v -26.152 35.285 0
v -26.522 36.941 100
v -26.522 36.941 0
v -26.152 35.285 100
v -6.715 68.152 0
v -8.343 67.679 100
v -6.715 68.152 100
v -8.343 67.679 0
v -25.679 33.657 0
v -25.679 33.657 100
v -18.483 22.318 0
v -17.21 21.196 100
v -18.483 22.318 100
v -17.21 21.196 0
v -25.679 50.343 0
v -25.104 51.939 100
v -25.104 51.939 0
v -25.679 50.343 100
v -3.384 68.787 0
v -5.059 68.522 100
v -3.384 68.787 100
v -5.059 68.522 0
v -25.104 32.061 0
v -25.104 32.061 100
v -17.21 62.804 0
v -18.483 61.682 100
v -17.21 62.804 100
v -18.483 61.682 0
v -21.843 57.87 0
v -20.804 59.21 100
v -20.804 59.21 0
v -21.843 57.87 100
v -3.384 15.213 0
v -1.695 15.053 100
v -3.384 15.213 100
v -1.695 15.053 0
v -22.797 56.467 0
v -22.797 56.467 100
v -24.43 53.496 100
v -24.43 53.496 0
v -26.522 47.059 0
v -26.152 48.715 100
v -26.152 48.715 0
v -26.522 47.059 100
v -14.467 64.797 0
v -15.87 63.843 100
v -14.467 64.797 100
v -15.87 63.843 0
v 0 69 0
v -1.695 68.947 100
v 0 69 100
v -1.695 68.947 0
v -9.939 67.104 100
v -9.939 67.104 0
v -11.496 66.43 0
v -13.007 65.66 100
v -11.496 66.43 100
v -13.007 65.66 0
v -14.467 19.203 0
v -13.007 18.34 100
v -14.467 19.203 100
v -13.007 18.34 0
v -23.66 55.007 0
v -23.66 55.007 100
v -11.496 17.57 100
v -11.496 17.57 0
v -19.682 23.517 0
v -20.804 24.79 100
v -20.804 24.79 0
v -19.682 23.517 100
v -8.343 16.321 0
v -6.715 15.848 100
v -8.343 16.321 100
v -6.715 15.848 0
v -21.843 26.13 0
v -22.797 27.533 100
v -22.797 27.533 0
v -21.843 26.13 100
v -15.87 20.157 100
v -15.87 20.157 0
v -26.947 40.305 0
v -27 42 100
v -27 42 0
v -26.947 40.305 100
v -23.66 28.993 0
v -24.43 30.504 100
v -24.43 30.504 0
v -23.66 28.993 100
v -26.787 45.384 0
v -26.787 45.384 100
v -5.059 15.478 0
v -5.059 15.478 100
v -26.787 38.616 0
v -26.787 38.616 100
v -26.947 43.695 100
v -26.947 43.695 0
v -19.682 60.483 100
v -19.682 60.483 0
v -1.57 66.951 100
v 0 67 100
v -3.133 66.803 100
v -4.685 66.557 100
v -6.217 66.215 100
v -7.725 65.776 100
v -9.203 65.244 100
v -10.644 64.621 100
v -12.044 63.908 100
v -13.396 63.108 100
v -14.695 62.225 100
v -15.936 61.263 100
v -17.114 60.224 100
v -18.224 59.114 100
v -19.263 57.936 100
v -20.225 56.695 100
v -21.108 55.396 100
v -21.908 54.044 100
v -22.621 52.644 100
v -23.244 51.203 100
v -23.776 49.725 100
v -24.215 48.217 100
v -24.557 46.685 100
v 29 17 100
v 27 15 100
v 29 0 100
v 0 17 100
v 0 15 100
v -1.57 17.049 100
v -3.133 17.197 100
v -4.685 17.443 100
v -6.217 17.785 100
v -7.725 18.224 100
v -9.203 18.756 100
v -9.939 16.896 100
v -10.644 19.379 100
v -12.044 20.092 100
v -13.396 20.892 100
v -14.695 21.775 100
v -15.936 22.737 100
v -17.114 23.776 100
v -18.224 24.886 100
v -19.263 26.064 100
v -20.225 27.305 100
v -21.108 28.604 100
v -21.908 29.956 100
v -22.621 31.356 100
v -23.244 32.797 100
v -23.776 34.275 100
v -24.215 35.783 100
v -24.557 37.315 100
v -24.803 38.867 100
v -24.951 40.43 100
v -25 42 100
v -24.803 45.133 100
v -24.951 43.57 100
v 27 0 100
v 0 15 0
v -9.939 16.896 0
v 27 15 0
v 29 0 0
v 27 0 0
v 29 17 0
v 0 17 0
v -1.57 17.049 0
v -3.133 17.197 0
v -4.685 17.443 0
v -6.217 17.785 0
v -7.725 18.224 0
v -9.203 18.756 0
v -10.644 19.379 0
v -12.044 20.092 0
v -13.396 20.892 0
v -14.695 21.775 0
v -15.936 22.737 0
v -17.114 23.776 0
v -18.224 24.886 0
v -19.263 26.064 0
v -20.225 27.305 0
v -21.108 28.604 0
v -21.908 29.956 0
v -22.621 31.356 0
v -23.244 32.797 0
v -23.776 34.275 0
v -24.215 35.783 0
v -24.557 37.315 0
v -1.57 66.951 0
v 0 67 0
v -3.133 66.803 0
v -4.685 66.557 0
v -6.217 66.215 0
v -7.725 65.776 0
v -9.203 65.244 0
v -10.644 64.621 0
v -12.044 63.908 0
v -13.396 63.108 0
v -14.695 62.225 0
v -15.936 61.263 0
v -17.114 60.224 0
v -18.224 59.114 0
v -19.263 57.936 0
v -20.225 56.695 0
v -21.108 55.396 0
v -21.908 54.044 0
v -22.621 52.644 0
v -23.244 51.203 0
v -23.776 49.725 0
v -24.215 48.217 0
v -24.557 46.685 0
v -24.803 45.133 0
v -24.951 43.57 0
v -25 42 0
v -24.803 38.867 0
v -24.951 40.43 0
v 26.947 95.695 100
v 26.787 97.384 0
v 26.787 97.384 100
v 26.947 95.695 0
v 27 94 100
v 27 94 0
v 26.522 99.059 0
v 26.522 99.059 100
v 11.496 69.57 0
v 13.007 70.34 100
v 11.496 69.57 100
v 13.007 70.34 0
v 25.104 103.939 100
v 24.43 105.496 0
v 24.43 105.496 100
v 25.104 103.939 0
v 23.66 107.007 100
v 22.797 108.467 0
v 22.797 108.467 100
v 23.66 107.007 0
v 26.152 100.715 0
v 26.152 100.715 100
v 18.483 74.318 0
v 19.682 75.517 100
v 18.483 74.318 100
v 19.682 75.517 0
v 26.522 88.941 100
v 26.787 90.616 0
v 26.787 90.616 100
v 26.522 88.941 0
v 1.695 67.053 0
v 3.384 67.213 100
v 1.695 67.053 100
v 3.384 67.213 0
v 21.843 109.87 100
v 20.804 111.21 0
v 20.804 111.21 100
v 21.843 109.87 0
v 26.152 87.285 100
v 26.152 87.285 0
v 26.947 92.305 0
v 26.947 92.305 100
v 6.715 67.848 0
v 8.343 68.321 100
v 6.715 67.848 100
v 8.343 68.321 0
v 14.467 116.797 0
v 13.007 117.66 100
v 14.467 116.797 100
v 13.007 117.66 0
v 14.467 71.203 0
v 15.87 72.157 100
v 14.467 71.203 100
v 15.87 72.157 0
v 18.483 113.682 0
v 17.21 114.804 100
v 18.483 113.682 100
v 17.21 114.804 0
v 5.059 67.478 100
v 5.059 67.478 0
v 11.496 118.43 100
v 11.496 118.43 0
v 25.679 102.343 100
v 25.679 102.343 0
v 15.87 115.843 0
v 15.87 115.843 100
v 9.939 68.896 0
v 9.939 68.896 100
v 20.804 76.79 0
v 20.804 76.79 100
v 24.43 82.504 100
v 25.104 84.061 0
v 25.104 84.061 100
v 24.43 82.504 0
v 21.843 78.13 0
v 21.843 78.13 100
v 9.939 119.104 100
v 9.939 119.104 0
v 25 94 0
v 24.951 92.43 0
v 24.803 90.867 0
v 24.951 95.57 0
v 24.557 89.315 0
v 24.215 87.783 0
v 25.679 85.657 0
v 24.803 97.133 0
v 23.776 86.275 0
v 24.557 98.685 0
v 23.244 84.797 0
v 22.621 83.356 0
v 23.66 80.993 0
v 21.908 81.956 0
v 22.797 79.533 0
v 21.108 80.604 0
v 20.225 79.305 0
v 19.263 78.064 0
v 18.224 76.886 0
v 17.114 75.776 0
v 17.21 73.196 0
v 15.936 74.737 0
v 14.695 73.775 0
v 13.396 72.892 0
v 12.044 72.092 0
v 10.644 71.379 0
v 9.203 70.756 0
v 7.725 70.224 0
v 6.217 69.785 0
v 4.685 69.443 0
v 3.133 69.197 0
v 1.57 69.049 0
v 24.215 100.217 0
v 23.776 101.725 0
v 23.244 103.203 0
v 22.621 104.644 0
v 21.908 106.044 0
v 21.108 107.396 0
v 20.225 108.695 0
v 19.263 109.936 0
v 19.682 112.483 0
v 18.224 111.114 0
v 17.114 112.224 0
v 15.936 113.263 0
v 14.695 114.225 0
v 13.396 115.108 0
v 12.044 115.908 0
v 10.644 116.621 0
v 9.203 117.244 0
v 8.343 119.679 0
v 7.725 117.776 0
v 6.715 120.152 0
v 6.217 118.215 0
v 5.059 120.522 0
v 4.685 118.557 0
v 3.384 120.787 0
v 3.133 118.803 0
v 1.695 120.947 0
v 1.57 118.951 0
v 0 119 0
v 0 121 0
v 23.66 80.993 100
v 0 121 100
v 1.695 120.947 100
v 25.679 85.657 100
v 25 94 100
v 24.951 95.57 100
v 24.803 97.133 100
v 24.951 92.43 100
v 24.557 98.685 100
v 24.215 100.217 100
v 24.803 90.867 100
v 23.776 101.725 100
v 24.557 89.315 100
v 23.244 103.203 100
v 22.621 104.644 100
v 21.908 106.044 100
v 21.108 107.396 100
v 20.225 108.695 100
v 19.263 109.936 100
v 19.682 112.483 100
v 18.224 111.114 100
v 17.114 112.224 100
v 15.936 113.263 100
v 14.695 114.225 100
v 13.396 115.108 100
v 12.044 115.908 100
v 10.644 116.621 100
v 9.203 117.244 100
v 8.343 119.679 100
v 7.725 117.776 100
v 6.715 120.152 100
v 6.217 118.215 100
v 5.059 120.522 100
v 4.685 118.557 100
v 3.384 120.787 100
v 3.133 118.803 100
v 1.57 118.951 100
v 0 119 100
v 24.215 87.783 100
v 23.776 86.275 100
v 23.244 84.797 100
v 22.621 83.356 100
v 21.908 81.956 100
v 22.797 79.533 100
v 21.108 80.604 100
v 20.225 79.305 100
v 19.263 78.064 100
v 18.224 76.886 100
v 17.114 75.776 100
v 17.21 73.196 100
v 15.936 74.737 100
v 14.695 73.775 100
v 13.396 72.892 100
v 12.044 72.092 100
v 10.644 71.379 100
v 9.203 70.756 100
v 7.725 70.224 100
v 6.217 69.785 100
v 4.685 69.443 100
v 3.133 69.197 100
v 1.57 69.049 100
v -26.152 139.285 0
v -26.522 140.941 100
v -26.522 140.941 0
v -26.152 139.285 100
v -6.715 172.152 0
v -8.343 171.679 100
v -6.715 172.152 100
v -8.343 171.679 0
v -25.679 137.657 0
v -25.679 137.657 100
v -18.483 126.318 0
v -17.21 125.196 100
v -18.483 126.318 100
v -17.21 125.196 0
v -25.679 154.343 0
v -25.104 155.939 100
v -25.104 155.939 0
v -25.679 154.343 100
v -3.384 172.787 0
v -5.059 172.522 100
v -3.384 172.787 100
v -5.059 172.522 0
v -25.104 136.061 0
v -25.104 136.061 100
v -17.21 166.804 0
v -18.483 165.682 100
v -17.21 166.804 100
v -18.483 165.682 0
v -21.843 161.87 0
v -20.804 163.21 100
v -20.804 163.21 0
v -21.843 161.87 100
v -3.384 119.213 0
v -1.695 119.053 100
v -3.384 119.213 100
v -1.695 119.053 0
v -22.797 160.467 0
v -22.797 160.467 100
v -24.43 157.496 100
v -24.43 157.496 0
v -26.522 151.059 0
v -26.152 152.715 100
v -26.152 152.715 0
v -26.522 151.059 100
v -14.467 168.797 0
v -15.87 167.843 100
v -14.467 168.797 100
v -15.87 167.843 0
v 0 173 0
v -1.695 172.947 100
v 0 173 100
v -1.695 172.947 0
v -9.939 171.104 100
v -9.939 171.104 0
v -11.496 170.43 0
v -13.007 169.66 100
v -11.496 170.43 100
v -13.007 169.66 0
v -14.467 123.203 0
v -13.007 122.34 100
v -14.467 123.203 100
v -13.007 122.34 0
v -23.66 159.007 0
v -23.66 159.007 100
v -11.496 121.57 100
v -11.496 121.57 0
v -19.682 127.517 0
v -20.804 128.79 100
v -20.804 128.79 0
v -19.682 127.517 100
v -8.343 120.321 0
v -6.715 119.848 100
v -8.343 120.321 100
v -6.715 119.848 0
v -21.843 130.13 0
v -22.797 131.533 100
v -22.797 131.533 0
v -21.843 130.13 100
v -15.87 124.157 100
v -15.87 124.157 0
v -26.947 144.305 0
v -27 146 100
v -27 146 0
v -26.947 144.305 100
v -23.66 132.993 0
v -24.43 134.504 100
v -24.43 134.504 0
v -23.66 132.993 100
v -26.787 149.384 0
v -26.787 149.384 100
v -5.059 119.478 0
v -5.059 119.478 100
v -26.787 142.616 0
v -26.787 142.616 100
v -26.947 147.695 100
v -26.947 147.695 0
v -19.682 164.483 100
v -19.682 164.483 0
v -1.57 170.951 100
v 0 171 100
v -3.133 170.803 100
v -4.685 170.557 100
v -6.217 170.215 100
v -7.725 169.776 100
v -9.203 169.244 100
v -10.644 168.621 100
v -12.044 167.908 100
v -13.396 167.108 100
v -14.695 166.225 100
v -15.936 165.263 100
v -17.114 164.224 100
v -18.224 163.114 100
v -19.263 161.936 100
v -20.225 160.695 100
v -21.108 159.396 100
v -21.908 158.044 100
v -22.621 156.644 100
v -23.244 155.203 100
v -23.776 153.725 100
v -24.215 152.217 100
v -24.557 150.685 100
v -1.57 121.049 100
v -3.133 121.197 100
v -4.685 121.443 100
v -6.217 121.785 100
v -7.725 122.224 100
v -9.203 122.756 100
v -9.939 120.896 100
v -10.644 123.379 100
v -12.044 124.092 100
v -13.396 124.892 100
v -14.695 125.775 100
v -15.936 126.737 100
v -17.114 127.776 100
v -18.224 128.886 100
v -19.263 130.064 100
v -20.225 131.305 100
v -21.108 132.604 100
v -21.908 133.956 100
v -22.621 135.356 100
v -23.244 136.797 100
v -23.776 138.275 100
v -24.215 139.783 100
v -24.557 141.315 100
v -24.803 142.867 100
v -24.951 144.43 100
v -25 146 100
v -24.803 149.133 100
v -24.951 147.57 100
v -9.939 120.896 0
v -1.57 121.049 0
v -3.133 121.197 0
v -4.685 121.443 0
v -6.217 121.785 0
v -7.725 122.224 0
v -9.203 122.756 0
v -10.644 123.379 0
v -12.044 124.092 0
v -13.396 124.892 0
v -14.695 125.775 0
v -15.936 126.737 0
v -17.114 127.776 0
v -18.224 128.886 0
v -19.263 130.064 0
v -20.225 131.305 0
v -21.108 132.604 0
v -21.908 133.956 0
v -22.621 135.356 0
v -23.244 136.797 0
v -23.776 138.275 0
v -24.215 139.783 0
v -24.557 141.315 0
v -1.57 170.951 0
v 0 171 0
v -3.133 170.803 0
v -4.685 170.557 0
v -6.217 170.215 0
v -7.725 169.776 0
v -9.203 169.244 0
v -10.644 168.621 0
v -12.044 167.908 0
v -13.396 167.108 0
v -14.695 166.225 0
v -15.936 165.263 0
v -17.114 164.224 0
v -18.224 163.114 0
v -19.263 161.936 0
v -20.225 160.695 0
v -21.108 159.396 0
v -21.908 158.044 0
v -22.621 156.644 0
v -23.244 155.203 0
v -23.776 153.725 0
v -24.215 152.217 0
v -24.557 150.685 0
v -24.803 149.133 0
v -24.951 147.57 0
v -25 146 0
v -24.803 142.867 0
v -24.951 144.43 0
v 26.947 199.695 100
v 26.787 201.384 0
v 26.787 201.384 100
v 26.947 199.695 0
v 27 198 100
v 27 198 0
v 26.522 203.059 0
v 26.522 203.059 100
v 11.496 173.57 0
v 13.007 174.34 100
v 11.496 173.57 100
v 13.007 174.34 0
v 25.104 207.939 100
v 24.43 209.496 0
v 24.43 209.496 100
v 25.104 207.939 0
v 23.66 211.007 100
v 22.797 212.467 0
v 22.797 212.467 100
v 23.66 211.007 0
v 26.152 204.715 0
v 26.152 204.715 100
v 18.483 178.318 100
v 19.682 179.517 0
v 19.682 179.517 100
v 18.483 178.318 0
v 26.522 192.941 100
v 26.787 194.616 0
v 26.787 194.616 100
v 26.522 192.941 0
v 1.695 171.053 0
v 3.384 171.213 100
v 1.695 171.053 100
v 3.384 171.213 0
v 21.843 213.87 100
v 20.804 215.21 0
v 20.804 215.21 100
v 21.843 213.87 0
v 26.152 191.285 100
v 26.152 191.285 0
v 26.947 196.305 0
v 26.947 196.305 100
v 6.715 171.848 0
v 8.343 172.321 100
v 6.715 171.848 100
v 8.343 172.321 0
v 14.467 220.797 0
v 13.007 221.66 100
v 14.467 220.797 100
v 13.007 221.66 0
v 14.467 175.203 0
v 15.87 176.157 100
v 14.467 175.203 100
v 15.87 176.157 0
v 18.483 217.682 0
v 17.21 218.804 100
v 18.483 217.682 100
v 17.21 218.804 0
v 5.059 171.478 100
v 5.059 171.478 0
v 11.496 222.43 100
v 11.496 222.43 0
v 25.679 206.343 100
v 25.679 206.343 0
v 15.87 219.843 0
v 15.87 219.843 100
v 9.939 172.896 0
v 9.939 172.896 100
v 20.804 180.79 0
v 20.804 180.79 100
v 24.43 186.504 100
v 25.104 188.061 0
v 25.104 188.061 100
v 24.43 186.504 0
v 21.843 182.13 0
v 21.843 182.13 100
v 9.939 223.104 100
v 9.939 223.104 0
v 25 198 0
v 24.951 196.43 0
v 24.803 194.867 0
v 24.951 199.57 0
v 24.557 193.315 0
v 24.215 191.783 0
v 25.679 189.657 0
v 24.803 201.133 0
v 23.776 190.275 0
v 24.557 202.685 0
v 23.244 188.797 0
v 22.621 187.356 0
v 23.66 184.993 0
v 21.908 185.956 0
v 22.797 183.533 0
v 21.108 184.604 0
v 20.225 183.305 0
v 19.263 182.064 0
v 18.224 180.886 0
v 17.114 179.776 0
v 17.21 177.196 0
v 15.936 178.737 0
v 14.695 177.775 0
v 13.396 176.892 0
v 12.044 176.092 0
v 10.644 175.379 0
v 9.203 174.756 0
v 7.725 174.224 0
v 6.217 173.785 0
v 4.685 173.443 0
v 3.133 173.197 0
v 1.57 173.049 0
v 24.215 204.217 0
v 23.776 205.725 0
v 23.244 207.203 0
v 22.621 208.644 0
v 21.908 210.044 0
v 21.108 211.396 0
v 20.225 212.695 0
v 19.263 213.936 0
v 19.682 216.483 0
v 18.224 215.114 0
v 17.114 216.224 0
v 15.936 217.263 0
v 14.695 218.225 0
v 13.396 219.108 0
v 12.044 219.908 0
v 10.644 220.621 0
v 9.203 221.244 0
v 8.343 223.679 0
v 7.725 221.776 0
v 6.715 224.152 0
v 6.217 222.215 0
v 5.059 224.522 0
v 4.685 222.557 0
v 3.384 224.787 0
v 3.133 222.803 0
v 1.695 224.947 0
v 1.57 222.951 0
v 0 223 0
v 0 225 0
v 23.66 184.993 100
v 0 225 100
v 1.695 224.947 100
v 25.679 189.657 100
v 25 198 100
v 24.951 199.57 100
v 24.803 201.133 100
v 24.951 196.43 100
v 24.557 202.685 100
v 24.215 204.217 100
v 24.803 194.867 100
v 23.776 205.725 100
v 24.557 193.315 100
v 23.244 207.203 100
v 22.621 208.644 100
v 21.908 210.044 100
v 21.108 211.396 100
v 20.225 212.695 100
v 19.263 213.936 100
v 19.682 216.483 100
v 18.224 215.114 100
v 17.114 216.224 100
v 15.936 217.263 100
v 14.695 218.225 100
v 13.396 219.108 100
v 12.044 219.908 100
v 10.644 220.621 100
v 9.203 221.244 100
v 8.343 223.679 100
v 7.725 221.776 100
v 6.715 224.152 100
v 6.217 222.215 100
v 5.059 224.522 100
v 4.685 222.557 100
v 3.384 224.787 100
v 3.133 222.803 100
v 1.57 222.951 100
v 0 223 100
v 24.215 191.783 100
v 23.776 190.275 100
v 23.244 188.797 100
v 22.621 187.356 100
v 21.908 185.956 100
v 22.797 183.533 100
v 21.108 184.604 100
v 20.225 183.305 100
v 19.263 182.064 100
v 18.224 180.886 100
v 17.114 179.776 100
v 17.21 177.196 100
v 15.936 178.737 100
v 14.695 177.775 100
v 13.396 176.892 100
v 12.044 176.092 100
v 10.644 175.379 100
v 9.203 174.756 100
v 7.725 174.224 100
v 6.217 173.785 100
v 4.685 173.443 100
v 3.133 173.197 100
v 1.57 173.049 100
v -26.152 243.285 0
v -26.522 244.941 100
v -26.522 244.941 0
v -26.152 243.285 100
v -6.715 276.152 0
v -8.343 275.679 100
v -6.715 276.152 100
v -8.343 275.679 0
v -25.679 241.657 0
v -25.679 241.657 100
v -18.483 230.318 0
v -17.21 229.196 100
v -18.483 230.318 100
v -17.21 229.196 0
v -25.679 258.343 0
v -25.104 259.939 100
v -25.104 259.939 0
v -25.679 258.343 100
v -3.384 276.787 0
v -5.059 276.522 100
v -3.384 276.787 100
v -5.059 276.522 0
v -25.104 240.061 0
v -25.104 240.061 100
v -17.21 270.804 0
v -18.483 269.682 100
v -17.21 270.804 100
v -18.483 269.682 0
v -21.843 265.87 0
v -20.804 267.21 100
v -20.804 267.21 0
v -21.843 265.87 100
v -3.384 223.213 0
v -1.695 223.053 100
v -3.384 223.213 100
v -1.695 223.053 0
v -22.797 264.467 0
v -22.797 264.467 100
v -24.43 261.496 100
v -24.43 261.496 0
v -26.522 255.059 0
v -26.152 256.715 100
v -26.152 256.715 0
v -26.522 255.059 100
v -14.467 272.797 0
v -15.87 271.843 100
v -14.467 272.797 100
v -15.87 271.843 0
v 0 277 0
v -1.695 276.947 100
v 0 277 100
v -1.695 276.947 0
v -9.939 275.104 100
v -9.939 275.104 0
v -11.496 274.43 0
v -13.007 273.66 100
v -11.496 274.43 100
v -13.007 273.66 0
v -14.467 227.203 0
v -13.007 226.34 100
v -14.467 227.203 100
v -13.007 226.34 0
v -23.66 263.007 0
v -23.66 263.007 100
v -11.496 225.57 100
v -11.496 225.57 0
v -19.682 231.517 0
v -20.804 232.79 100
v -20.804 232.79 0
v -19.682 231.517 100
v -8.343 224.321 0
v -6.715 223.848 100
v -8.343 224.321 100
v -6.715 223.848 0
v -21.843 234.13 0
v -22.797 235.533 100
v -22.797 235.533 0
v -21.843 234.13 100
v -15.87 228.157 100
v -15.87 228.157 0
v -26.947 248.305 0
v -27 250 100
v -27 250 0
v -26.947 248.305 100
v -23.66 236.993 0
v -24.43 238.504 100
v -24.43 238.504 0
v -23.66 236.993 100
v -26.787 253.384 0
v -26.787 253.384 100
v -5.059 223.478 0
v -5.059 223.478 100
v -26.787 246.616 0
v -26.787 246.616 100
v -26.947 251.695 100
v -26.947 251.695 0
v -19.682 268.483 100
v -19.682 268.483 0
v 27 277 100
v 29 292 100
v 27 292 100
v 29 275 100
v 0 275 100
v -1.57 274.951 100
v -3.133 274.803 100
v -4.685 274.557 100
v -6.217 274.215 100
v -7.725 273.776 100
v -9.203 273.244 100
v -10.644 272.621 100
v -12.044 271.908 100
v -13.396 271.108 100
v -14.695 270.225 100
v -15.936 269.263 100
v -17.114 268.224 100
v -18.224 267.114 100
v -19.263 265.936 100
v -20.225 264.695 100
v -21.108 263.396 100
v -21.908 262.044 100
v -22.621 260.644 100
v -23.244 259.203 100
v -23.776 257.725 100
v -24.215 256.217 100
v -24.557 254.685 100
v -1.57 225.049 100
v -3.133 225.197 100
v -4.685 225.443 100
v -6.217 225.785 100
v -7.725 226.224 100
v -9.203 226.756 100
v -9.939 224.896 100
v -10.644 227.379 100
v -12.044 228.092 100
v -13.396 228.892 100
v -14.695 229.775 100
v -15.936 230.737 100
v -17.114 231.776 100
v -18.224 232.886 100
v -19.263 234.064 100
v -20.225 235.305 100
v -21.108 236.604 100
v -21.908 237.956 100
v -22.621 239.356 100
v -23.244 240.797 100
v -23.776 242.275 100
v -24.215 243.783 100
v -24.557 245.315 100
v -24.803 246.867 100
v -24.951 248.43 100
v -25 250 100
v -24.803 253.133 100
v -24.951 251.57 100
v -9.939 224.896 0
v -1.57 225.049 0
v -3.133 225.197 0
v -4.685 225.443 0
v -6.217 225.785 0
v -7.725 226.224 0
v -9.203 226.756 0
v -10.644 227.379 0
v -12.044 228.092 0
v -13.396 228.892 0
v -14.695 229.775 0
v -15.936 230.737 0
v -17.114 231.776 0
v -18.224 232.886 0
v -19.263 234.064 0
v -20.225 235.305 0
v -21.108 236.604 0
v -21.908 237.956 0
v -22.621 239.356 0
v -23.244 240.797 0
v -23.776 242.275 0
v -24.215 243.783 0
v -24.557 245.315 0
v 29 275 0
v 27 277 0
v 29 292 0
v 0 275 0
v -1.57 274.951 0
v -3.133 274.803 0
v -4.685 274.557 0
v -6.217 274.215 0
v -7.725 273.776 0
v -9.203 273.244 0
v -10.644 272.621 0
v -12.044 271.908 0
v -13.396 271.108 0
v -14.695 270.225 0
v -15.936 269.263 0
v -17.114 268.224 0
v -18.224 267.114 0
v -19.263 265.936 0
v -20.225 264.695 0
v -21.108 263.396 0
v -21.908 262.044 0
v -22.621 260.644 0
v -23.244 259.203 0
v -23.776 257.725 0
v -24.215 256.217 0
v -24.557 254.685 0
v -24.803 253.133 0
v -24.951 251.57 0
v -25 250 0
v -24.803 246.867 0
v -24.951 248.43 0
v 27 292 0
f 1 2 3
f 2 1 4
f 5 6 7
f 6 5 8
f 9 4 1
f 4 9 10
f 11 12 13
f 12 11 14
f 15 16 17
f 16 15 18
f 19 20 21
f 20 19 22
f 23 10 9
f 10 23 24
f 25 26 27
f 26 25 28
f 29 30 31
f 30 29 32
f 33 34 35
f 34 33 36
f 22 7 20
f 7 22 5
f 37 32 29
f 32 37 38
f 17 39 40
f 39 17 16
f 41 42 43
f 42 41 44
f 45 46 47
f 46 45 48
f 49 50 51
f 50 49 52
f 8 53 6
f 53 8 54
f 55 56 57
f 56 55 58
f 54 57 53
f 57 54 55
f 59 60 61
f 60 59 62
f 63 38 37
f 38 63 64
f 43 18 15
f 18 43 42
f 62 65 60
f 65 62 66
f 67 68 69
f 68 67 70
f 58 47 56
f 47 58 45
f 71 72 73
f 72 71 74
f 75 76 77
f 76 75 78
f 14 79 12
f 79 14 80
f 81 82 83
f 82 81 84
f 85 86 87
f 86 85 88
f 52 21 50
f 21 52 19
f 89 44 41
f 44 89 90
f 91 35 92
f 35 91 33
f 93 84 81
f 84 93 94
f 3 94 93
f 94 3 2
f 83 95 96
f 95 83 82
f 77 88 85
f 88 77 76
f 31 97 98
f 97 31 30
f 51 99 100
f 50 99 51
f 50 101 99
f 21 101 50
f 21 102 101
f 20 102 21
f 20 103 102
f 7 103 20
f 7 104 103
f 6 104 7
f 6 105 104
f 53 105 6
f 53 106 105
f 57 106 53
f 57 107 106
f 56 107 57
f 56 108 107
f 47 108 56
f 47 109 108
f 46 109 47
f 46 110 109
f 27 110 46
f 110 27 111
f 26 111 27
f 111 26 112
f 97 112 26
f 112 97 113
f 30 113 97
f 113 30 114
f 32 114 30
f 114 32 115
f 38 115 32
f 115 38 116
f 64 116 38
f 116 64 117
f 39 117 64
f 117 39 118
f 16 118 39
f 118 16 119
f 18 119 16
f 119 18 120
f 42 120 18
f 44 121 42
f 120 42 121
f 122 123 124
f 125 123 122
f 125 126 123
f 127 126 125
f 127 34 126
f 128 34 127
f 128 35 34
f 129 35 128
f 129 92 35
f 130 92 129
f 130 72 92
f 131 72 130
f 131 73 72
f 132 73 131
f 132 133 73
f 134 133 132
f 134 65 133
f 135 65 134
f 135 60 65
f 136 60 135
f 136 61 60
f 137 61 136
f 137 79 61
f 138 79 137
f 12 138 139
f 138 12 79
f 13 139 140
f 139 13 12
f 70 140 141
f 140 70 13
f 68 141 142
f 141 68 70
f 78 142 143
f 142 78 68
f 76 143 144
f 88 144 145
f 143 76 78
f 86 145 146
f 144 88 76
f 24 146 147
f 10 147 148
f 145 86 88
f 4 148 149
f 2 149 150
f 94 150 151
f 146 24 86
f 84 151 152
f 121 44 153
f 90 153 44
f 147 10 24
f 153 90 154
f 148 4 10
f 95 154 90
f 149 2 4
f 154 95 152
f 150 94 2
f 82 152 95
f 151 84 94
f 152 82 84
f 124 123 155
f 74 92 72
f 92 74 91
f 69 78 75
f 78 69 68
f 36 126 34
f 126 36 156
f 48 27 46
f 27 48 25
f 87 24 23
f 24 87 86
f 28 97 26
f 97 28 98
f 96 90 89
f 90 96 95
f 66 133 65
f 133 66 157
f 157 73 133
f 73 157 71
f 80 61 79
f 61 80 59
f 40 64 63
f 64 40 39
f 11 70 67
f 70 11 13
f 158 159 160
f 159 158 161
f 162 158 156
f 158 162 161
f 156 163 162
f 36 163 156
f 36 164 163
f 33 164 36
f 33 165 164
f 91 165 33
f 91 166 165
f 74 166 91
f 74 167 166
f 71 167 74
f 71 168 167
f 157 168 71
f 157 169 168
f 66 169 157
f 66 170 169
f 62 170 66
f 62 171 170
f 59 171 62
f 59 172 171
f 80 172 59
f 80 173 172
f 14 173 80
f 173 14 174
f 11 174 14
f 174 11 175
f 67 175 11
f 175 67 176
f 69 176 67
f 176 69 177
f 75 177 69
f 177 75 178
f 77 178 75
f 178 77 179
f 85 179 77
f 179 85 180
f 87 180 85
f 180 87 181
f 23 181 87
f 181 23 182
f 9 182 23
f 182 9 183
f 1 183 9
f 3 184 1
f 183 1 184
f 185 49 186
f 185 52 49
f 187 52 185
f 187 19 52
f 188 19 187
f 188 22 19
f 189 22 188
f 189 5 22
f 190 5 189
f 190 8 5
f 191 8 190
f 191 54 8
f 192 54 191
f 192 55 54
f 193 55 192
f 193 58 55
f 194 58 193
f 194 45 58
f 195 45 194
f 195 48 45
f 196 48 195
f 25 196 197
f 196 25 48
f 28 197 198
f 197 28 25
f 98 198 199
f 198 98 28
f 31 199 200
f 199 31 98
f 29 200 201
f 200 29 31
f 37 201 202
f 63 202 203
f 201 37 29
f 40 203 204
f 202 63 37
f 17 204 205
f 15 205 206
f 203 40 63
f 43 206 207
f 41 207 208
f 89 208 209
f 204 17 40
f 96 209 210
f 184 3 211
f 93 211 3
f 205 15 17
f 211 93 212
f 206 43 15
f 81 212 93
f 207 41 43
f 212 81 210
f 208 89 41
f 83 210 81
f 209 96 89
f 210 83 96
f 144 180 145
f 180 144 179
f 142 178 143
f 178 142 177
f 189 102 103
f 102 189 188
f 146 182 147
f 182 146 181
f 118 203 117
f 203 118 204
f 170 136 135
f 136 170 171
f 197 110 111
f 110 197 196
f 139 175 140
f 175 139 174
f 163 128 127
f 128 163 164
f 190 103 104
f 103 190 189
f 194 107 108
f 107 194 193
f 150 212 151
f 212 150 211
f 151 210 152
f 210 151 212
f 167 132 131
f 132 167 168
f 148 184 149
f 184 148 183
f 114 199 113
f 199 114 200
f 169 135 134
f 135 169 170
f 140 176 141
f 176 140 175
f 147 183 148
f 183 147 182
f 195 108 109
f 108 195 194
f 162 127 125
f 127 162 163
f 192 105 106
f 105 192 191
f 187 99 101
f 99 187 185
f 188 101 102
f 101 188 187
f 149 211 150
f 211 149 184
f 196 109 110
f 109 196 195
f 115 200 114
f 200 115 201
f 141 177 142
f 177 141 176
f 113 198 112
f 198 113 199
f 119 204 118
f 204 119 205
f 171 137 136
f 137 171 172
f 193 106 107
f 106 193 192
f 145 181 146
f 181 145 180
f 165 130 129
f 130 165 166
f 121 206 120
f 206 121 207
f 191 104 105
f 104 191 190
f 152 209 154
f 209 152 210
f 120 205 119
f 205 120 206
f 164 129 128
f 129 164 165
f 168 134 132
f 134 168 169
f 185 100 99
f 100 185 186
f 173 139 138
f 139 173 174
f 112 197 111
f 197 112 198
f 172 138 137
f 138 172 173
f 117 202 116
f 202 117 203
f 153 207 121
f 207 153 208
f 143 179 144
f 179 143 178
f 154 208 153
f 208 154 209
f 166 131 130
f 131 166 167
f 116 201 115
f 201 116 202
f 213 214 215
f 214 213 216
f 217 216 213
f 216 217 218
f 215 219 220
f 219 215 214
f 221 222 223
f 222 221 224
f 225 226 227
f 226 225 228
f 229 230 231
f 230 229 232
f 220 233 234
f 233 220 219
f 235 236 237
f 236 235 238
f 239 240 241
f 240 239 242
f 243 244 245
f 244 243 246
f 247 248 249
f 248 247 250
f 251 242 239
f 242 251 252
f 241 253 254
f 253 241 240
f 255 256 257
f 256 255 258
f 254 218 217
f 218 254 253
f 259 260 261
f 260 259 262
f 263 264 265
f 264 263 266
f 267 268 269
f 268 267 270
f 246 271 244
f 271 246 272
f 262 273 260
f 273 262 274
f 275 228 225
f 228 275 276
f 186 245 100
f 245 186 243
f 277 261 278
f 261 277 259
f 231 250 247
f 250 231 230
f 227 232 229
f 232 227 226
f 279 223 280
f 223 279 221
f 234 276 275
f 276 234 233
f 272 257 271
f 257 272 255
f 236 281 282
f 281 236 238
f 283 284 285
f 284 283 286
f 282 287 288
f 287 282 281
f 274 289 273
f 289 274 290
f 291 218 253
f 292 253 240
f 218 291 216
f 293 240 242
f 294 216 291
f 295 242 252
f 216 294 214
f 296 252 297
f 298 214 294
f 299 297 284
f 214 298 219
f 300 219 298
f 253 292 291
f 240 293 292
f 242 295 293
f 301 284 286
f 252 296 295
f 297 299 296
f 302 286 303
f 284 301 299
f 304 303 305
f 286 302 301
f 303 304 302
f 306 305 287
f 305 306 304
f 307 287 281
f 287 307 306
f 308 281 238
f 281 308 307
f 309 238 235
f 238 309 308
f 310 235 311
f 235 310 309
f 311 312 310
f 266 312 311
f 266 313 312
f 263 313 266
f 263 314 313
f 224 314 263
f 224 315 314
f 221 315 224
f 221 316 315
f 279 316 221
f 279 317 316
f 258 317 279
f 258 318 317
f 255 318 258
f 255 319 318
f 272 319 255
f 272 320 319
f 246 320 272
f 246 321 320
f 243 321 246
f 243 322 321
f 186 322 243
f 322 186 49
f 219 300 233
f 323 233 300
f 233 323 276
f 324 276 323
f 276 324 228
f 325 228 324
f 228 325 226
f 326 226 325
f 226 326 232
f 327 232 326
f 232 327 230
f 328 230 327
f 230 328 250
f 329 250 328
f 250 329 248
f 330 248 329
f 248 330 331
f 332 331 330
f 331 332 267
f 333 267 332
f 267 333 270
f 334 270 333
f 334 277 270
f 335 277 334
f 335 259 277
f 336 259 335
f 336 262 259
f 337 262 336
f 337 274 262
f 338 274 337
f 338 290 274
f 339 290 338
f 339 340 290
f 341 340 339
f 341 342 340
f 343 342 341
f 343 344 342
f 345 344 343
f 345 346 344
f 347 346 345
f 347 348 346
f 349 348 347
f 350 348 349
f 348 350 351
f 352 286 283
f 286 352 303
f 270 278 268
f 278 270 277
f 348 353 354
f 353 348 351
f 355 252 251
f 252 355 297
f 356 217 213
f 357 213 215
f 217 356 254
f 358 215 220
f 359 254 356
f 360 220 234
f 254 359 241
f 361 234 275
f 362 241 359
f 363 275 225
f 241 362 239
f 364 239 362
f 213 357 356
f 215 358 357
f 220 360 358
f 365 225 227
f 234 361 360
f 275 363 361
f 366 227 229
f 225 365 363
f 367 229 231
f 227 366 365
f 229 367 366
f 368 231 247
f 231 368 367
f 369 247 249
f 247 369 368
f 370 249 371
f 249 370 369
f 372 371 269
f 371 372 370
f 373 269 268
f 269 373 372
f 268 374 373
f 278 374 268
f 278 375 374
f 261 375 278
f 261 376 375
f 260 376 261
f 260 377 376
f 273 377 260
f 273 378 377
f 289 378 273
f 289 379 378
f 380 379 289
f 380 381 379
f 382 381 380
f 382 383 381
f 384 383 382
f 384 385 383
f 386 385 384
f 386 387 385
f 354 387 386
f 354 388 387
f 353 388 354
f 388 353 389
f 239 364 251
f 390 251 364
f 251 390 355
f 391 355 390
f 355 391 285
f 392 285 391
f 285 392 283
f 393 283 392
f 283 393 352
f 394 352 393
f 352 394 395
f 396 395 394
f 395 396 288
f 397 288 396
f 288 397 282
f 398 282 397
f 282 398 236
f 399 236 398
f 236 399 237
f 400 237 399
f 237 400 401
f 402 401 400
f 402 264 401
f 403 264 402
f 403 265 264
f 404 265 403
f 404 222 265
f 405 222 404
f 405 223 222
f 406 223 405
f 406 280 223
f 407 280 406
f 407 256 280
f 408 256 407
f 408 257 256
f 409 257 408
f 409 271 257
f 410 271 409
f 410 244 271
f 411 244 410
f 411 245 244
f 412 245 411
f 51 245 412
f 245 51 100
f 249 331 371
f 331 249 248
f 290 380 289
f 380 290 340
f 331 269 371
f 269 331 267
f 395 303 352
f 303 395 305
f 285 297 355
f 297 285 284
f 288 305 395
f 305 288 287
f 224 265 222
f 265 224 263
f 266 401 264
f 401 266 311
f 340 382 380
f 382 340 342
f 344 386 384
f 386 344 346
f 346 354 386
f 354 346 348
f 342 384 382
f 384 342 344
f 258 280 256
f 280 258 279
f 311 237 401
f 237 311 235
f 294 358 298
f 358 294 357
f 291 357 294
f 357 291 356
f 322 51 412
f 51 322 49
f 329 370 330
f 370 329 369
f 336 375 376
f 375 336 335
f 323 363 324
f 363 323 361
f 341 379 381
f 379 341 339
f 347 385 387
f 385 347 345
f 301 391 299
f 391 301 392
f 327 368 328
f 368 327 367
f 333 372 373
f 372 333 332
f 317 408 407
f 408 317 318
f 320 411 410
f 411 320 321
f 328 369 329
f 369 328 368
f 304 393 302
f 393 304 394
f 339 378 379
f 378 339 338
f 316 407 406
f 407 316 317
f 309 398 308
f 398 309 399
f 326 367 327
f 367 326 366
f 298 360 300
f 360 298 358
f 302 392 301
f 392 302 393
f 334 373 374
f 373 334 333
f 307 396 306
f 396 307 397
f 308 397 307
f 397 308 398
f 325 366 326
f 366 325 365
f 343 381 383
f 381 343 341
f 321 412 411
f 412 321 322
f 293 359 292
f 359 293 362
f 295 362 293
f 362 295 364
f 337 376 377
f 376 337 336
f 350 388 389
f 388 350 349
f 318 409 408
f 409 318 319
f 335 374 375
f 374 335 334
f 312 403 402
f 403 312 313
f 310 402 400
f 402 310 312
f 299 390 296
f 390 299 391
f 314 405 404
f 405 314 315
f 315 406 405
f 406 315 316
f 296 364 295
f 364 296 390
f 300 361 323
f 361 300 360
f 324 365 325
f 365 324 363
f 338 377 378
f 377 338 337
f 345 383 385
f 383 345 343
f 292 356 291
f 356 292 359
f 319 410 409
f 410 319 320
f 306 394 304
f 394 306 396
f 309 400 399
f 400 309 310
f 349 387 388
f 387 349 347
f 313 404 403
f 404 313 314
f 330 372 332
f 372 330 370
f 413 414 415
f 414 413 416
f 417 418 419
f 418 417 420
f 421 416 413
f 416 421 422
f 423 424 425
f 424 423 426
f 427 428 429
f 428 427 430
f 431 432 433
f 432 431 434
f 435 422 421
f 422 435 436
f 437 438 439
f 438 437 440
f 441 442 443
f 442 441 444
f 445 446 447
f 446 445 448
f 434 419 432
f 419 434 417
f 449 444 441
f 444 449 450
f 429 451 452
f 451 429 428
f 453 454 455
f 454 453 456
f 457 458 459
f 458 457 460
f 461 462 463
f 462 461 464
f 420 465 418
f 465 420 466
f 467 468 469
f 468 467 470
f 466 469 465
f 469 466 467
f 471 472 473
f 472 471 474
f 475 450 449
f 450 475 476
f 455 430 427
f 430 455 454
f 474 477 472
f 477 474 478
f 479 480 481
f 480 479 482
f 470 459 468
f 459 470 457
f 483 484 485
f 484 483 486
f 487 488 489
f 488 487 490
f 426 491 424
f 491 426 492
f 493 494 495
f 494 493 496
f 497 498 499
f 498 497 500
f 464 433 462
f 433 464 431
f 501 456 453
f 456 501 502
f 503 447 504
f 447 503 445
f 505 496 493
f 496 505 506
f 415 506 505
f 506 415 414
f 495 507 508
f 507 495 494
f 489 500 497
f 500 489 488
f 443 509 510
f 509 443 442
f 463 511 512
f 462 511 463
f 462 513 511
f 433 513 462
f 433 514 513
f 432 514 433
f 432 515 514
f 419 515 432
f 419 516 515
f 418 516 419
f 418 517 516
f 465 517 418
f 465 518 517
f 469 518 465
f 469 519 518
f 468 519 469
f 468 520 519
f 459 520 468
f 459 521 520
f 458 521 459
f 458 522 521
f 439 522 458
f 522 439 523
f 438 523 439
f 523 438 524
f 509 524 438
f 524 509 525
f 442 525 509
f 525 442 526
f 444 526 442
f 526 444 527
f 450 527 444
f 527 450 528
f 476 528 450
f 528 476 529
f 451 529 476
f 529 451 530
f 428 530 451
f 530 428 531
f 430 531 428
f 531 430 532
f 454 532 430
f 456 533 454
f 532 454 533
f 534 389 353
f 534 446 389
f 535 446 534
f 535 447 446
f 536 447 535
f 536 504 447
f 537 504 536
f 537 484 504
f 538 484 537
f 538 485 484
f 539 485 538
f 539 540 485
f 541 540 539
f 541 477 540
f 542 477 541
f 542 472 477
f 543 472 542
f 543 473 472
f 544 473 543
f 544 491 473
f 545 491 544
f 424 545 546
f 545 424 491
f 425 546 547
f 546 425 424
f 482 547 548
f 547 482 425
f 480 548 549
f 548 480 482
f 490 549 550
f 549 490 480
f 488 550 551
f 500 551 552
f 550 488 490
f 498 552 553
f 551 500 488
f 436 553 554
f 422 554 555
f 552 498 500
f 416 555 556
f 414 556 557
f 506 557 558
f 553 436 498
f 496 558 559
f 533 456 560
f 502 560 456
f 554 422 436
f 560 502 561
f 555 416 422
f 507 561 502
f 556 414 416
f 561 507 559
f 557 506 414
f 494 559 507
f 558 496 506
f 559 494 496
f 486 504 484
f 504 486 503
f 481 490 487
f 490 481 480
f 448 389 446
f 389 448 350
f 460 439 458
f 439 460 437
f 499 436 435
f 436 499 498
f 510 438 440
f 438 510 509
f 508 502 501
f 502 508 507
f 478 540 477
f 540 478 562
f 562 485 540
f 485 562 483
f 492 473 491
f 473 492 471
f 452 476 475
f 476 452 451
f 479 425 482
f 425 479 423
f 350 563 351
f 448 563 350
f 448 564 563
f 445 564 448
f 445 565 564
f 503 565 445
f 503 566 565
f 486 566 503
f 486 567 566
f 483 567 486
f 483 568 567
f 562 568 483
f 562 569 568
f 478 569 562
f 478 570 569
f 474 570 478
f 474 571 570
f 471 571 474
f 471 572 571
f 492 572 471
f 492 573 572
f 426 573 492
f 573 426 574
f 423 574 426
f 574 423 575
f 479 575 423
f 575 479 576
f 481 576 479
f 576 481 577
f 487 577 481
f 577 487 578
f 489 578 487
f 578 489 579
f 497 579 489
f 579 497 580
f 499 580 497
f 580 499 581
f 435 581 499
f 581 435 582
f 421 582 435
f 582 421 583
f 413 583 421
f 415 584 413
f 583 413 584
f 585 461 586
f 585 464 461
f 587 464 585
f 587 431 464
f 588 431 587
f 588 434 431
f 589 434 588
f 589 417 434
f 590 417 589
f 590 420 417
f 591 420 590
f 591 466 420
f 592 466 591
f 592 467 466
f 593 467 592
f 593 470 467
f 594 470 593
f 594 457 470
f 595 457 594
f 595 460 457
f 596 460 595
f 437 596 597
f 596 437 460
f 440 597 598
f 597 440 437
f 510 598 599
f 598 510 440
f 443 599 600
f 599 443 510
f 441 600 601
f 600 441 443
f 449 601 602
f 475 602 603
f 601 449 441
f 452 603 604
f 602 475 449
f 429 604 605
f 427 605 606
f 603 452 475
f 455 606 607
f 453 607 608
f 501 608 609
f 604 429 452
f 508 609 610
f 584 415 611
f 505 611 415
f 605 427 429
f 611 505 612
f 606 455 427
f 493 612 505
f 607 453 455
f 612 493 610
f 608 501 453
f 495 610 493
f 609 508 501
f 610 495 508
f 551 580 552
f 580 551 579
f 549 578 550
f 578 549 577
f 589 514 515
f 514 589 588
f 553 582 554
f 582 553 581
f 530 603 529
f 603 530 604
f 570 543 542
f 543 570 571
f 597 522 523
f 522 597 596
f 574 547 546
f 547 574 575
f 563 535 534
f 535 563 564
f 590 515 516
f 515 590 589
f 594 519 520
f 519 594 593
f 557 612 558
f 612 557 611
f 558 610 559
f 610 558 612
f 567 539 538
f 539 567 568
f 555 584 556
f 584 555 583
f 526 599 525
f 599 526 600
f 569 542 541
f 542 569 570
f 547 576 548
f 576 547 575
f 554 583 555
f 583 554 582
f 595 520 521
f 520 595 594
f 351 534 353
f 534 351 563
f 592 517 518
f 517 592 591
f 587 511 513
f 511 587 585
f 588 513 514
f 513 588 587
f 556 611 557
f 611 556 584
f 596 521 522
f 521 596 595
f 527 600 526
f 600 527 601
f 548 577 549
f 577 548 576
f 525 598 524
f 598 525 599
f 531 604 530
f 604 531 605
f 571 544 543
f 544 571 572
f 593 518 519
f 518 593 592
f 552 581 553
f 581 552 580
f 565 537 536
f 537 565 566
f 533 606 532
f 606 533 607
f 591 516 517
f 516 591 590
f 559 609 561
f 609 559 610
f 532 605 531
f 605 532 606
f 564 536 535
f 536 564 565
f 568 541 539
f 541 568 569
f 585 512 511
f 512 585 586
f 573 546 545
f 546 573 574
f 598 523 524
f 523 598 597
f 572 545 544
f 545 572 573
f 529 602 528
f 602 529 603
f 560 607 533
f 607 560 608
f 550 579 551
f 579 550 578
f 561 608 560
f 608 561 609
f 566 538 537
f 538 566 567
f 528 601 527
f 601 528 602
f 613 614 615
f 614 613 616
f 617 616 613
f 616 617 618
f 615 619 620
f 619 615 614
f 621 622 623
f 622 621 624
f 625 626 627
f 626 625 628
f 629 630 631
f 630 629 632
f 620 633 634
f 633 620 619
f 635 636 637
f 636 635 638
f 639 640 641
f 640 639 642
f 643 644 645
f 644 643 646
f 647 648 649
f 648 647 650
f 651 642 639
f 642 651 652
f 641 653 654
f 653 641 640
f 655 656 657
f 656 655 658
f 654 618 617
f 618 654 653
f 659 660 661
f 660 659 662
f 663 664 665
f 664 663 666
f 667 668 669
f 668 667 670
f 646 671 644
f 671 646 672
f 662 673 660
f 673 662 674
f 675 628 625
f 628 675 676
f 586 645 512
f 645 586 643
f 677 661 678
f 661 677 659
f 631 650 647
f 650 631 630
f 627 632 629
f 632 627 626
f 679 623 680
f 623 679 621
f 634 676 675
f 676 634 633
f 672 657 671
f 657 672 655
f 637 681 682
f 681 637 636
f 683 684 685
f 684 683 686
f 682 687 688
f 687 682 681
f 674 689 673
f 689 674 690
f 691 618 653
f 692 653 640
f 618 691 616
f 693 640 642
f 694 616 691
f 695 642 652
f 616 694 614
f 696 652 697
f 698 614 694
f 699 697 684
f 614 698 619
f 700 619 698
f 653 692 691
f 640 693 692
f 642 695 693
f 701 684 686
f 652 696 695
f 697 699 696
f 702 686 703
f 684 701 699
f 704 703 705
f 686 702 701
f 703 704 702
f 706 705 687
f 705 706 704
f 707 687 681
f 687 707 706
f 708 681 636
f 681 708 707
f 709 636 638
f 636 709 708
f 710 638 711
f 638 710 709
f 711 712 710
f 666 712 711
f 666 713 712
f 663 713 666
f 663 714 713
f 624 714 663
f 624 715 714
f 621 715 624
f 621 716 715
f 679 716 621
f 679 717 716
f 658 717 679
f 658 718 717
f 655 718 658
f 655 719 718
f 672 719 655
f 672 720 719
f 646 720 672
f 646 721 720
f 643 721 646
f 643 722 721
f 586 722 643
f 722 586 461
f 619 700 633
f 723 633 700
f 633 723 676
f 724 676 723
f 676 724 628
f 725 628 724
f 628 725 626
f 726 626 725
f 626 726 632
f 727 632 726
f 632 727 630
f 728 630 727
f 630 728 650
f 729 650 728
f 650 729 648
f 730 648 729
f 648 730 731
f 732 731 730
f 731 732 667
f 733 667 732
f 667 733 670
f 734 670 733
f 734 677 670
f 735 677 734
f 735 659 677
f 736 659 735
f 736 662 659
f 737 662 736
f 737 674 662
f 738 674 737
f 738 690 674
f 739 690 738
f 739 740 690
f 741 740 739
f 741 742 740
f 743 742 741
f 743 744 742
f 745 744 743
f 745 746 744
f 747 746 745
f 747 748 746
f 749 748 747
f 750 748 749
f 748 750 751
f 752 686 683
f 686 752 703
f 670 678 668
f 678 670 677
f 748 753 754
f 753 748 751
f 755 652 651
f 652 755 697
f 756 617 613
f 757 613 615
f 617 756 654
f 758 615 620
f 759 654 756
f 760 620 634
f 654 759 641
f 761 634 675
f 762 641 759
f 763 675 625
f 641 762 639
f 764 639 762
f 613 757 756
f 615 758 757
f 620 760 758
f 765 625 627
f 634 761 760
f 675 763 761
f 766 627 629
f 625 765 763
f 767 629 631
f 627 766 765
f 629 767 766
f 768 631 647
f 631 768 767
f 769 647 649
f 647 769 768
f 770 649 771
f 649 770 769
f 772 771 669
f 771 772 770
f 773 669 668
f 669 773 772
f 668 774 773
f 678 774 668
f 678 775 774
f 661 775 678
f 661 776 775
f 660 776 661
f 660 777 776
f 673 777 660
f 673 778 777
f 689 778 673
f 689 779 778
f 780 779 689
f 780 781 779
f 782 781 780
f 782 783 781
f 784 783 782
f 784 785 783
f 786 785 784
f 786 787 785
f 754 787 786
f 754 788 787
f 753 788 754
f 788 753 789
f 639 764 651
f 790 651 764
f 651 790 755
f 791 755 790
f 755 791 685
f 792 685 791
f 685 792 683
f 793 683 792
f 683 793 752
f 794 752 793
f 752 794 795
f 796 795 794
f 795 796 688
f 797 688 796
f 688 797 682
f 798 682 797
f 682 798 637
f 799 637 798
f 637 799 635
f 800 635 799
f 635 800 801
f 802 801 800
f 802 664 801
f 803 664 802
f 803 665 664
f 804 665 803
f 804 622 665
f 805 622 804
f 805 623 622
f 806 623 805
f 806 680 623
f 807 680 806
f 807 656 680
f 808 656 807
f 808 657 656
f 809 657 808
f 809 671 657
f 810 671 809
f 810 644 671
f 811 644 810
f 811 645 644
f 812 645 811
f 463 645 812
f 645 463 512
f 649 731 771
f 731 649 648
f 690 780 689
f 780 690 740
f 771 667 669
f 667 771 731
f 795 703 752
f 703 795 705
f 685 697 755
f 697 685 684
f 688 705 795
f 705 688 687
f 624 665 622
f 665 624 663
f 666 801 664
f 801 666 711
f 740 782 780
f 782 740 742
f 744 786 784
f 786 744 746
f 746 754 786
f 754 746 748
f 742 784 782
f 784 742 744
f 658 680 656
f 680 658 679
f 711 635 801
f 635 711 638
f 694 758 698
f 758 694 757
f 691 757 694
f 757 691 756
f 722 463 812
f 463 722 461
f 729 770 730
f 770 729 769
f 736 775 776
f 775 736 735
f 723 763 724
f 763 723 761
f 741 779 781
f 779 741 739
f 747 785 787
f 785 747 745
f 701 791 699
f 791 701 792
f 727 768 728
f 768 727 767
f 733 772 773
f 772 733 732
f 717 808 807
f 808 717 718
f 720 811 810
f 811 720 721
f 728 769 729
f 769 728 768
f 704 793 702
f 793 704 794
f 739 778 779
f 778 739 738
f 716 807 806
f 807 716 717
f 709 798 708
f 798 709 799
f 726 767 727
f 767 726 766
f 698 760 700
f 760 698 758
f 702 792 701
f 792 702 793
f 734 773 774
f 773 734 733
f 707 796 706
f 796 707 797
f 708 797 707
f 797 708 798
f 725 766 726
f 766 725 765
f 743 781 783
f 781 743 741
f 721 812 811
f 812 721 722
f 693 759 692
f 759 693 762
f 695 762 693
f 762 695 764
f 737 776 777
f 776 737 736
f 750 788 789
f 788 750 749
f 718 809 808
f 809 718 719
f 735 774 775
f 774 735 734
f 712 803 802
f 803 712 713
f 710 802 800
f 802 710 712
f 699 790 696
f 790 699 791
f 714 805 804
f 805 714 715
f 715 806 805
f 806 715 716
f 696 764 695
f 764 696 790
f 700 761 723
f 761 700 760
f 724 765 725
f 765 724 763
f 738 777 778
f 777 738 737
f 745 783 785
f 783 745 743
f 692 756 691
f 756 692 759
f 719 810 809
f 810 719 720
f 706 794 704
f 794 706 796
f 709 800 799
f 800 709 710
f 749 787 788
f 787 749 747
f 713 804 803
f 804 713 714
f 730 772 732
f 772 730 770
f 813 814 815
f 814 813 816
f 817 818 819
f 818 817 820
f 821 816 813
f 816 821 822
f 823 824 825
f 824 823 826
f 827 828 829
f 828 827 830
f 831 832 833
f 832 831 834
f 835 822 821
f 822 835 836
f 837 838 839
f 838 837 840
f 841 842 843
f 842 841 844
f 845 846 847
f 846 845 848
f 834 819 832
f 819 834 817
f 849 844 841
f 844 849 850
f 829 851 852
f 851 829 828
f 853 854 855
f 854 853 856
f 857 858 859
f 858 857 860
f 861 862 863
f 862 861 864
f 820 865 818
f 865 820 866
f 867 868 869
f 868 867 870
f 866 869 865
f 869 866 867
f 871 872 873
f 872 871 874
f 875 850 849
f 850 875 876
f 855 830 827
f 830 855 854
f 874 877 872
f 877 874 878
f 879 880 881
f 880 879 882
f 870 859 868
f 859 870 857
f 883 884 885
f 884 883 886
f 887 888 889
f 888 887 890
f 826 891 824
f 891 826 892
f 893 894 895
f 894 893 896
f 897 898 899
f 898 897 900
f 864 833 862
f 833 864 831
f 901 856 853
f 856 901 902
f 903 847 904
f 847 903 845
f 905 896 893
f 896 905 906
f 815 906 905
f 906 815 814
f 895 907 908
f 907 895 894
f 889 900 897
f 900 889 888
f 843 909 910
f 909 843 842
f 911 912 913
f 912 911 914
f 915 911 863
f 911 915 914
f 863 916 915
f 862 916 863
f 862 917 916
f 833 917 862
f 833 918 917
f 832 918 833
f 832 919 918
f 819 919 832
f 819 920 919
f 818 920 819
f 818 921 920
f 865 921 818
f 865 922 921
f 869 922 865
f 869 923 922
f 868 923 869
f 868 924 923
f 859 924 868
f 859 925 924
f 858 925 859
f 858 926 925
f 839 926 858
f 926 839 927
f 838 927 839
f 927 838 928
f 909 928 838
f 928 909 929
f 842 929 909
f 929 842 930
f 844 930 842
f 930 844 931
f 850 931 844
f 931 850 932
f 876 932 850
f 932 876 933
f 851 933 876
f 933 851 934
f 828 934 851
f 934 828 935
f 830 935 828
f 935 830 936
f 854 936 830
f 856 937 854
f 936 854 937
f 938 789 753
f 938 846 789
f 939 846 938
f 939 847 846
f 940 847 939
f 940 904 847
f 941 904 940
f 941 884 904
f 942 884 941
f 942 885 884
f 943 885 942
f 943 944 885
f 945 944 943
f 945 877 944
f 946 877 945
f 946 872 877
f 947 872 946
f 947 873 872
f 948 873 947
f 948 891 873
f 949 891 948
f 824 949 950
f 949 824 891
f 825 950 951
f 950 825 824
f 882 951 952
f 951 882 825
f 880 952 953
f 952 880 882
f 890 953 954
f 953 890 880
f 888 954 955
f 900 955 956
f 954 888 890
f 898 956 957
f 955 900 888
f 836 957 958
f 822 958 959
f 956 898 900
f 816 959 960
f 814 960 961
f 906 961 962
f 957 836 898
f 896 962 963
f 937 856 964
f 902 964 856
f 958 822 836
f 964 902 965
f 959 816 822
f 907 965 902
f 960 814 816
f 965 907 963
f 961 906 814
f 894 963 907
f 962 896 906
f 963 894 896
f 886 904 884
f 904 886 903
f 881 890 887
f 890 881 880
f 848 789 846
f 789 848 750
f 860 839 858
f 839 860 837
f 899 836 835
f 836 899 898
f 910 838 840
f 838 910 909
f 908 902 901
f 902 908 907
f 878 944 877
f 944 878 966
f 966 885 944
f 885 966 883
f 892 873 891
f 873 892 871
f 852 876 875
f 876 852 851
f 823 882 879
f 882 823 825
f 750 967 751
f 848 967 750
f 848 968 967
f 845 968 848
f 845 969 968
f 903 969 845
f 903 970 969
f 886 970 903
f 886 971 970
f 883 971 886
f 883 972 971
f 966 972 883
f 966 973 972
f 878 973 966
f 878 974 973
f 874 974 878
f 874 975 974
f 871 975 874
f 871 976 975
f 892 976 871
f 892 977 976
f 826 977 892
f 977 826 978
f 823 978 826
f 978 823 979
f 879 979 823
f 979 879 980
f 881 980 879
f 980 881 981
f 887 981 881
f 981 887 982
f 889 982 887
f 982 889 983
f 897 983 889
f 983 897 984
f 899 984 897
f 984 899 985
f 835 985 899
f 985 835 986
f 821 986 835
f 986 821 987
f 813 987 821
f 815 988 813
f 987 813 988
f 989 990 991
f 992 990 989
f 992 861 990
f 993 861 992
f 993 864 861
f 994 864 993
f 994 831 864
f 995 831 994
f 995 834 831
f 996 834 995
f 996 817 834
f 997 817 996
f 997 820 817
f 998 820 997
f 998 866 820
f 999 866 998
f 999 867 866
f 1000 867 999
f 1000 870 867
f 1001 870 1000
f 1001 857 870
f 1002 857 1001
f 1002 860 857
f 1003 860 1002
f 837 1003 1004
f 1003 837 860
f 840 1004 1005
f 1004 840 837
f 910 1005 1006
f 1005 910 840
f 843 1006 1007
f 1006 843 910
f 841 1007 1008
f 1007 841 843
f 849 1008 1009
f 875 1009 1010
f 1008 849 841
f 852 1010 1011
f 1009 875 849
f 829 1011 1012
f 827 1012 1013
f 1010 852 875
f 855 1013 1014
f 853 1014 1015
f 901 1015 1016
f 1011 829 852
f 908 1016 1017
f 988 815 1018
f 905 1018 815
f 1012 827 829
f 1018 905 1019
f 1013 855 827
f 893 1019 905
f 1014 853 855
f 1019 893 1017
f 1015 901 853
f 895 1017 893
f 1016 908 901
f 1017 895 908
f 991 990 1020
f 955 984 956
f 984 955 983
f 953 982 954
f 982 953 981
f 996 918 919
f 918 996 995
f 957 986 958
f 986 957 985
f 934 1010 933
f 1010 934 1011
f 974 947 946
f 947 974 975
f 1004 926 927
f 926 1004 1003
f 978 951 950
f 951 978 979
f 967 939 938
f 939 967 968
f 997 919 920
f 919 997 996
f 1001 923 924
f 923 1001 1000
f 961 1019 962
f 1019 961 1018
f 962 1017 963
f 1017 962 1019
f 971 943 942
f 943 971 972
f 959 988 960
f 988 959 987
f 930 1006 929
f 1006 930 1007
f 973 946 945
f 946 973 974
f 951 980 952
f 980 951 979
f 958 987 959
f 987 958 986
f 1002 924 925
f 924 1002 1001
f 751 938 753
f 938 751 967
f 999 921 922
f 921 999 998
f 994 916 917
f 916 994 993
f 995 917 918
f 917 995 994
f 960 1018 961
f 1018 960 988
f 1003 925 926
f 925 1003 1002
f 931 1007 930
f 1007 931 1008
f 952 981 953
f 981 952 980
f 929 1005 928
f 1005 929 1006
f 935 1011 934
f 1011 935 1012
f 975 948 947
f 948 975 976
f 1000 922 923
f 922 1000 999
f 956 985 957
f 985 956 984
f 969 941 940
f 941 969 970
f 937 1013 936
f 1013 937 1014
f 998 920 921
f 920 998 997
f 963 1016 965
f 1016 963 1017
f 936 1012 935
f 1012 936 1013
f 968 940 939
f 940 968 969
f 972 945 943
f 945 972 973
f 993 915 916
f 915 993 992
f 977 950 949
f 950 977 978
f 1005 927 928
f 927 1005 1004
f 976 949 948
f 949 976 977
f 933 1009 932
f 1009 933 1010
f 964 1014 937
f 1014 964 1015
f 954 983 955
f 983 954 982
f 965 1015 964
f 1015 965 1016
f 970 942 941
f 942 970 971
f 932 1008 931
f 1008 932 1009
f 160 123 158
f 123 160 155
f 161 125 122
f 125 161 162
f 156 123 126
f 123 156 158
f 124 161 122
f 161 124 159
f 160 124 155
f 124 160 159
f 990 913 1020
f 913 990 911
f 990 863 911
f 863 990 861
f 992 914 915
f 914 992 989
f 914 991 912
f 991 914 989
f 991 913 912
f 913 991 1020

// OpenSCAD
// number of trays
n=2; // [0, 1, 2, 3, 4, 5]
// length of tray (cm)
l=10; // [5:1:20]
// diameter of trays (cm)
d=5.0; // [3:0.5:10]
// thickness (mm)
t=2.0; // [0.5:0.5:10]

translate([0,15,0])
cube([5*d+t,t,l*10]);
translate([5*d+t,0,0])
cube([t,15+t,l*10]);

translate([0,15+(n*2+1)*(10*d+t),0])
cube([5*d+t,t,l*10]);
translate([5*d+t,15+(n*2+1)*(10*d+t),0])
cube([t,15+t,l*10]);

translate([0,(d*5)+15+t,0])
difference()
{
    cylinder(r=(d*5)+t,h=l*10,$fn=100);
    translate([0,0,-1])
    cylinder(r=d*5,h=(l*10)+2,$fn=100);
    translate([0,-d*10,-1])
    cube([d*20,d*20,l*20]);
}
for(i=[1:n])
{
   translate([0,(5*d)+t+15+((i*2)-1)*(d*10+t),0])
   difference()
    {
        cylinder(r=(d*5)+t,h=l*10,$fn=100);
        translate([0,0,-1])
        cylinder(r=d*5,h=(l*10)+2,$fn=100);
        translate([-d*20,-d*10,-1])
        cube([d*20,d*20,l*20]);
    } 
    translate([0,(5*d)+t+15+i*2*(d*10+t),0])
    difference()
    {
        cylinder(r=(d*5)+t,h=l*10,$fn=100);
        translate([0,0,-1])
        cylinder(r=d*5,h=(l*10)+2,$fn=100);
        translate([0,-d*10,-1])
        cube([d*20,d*20,l*20]);
    } 
}
